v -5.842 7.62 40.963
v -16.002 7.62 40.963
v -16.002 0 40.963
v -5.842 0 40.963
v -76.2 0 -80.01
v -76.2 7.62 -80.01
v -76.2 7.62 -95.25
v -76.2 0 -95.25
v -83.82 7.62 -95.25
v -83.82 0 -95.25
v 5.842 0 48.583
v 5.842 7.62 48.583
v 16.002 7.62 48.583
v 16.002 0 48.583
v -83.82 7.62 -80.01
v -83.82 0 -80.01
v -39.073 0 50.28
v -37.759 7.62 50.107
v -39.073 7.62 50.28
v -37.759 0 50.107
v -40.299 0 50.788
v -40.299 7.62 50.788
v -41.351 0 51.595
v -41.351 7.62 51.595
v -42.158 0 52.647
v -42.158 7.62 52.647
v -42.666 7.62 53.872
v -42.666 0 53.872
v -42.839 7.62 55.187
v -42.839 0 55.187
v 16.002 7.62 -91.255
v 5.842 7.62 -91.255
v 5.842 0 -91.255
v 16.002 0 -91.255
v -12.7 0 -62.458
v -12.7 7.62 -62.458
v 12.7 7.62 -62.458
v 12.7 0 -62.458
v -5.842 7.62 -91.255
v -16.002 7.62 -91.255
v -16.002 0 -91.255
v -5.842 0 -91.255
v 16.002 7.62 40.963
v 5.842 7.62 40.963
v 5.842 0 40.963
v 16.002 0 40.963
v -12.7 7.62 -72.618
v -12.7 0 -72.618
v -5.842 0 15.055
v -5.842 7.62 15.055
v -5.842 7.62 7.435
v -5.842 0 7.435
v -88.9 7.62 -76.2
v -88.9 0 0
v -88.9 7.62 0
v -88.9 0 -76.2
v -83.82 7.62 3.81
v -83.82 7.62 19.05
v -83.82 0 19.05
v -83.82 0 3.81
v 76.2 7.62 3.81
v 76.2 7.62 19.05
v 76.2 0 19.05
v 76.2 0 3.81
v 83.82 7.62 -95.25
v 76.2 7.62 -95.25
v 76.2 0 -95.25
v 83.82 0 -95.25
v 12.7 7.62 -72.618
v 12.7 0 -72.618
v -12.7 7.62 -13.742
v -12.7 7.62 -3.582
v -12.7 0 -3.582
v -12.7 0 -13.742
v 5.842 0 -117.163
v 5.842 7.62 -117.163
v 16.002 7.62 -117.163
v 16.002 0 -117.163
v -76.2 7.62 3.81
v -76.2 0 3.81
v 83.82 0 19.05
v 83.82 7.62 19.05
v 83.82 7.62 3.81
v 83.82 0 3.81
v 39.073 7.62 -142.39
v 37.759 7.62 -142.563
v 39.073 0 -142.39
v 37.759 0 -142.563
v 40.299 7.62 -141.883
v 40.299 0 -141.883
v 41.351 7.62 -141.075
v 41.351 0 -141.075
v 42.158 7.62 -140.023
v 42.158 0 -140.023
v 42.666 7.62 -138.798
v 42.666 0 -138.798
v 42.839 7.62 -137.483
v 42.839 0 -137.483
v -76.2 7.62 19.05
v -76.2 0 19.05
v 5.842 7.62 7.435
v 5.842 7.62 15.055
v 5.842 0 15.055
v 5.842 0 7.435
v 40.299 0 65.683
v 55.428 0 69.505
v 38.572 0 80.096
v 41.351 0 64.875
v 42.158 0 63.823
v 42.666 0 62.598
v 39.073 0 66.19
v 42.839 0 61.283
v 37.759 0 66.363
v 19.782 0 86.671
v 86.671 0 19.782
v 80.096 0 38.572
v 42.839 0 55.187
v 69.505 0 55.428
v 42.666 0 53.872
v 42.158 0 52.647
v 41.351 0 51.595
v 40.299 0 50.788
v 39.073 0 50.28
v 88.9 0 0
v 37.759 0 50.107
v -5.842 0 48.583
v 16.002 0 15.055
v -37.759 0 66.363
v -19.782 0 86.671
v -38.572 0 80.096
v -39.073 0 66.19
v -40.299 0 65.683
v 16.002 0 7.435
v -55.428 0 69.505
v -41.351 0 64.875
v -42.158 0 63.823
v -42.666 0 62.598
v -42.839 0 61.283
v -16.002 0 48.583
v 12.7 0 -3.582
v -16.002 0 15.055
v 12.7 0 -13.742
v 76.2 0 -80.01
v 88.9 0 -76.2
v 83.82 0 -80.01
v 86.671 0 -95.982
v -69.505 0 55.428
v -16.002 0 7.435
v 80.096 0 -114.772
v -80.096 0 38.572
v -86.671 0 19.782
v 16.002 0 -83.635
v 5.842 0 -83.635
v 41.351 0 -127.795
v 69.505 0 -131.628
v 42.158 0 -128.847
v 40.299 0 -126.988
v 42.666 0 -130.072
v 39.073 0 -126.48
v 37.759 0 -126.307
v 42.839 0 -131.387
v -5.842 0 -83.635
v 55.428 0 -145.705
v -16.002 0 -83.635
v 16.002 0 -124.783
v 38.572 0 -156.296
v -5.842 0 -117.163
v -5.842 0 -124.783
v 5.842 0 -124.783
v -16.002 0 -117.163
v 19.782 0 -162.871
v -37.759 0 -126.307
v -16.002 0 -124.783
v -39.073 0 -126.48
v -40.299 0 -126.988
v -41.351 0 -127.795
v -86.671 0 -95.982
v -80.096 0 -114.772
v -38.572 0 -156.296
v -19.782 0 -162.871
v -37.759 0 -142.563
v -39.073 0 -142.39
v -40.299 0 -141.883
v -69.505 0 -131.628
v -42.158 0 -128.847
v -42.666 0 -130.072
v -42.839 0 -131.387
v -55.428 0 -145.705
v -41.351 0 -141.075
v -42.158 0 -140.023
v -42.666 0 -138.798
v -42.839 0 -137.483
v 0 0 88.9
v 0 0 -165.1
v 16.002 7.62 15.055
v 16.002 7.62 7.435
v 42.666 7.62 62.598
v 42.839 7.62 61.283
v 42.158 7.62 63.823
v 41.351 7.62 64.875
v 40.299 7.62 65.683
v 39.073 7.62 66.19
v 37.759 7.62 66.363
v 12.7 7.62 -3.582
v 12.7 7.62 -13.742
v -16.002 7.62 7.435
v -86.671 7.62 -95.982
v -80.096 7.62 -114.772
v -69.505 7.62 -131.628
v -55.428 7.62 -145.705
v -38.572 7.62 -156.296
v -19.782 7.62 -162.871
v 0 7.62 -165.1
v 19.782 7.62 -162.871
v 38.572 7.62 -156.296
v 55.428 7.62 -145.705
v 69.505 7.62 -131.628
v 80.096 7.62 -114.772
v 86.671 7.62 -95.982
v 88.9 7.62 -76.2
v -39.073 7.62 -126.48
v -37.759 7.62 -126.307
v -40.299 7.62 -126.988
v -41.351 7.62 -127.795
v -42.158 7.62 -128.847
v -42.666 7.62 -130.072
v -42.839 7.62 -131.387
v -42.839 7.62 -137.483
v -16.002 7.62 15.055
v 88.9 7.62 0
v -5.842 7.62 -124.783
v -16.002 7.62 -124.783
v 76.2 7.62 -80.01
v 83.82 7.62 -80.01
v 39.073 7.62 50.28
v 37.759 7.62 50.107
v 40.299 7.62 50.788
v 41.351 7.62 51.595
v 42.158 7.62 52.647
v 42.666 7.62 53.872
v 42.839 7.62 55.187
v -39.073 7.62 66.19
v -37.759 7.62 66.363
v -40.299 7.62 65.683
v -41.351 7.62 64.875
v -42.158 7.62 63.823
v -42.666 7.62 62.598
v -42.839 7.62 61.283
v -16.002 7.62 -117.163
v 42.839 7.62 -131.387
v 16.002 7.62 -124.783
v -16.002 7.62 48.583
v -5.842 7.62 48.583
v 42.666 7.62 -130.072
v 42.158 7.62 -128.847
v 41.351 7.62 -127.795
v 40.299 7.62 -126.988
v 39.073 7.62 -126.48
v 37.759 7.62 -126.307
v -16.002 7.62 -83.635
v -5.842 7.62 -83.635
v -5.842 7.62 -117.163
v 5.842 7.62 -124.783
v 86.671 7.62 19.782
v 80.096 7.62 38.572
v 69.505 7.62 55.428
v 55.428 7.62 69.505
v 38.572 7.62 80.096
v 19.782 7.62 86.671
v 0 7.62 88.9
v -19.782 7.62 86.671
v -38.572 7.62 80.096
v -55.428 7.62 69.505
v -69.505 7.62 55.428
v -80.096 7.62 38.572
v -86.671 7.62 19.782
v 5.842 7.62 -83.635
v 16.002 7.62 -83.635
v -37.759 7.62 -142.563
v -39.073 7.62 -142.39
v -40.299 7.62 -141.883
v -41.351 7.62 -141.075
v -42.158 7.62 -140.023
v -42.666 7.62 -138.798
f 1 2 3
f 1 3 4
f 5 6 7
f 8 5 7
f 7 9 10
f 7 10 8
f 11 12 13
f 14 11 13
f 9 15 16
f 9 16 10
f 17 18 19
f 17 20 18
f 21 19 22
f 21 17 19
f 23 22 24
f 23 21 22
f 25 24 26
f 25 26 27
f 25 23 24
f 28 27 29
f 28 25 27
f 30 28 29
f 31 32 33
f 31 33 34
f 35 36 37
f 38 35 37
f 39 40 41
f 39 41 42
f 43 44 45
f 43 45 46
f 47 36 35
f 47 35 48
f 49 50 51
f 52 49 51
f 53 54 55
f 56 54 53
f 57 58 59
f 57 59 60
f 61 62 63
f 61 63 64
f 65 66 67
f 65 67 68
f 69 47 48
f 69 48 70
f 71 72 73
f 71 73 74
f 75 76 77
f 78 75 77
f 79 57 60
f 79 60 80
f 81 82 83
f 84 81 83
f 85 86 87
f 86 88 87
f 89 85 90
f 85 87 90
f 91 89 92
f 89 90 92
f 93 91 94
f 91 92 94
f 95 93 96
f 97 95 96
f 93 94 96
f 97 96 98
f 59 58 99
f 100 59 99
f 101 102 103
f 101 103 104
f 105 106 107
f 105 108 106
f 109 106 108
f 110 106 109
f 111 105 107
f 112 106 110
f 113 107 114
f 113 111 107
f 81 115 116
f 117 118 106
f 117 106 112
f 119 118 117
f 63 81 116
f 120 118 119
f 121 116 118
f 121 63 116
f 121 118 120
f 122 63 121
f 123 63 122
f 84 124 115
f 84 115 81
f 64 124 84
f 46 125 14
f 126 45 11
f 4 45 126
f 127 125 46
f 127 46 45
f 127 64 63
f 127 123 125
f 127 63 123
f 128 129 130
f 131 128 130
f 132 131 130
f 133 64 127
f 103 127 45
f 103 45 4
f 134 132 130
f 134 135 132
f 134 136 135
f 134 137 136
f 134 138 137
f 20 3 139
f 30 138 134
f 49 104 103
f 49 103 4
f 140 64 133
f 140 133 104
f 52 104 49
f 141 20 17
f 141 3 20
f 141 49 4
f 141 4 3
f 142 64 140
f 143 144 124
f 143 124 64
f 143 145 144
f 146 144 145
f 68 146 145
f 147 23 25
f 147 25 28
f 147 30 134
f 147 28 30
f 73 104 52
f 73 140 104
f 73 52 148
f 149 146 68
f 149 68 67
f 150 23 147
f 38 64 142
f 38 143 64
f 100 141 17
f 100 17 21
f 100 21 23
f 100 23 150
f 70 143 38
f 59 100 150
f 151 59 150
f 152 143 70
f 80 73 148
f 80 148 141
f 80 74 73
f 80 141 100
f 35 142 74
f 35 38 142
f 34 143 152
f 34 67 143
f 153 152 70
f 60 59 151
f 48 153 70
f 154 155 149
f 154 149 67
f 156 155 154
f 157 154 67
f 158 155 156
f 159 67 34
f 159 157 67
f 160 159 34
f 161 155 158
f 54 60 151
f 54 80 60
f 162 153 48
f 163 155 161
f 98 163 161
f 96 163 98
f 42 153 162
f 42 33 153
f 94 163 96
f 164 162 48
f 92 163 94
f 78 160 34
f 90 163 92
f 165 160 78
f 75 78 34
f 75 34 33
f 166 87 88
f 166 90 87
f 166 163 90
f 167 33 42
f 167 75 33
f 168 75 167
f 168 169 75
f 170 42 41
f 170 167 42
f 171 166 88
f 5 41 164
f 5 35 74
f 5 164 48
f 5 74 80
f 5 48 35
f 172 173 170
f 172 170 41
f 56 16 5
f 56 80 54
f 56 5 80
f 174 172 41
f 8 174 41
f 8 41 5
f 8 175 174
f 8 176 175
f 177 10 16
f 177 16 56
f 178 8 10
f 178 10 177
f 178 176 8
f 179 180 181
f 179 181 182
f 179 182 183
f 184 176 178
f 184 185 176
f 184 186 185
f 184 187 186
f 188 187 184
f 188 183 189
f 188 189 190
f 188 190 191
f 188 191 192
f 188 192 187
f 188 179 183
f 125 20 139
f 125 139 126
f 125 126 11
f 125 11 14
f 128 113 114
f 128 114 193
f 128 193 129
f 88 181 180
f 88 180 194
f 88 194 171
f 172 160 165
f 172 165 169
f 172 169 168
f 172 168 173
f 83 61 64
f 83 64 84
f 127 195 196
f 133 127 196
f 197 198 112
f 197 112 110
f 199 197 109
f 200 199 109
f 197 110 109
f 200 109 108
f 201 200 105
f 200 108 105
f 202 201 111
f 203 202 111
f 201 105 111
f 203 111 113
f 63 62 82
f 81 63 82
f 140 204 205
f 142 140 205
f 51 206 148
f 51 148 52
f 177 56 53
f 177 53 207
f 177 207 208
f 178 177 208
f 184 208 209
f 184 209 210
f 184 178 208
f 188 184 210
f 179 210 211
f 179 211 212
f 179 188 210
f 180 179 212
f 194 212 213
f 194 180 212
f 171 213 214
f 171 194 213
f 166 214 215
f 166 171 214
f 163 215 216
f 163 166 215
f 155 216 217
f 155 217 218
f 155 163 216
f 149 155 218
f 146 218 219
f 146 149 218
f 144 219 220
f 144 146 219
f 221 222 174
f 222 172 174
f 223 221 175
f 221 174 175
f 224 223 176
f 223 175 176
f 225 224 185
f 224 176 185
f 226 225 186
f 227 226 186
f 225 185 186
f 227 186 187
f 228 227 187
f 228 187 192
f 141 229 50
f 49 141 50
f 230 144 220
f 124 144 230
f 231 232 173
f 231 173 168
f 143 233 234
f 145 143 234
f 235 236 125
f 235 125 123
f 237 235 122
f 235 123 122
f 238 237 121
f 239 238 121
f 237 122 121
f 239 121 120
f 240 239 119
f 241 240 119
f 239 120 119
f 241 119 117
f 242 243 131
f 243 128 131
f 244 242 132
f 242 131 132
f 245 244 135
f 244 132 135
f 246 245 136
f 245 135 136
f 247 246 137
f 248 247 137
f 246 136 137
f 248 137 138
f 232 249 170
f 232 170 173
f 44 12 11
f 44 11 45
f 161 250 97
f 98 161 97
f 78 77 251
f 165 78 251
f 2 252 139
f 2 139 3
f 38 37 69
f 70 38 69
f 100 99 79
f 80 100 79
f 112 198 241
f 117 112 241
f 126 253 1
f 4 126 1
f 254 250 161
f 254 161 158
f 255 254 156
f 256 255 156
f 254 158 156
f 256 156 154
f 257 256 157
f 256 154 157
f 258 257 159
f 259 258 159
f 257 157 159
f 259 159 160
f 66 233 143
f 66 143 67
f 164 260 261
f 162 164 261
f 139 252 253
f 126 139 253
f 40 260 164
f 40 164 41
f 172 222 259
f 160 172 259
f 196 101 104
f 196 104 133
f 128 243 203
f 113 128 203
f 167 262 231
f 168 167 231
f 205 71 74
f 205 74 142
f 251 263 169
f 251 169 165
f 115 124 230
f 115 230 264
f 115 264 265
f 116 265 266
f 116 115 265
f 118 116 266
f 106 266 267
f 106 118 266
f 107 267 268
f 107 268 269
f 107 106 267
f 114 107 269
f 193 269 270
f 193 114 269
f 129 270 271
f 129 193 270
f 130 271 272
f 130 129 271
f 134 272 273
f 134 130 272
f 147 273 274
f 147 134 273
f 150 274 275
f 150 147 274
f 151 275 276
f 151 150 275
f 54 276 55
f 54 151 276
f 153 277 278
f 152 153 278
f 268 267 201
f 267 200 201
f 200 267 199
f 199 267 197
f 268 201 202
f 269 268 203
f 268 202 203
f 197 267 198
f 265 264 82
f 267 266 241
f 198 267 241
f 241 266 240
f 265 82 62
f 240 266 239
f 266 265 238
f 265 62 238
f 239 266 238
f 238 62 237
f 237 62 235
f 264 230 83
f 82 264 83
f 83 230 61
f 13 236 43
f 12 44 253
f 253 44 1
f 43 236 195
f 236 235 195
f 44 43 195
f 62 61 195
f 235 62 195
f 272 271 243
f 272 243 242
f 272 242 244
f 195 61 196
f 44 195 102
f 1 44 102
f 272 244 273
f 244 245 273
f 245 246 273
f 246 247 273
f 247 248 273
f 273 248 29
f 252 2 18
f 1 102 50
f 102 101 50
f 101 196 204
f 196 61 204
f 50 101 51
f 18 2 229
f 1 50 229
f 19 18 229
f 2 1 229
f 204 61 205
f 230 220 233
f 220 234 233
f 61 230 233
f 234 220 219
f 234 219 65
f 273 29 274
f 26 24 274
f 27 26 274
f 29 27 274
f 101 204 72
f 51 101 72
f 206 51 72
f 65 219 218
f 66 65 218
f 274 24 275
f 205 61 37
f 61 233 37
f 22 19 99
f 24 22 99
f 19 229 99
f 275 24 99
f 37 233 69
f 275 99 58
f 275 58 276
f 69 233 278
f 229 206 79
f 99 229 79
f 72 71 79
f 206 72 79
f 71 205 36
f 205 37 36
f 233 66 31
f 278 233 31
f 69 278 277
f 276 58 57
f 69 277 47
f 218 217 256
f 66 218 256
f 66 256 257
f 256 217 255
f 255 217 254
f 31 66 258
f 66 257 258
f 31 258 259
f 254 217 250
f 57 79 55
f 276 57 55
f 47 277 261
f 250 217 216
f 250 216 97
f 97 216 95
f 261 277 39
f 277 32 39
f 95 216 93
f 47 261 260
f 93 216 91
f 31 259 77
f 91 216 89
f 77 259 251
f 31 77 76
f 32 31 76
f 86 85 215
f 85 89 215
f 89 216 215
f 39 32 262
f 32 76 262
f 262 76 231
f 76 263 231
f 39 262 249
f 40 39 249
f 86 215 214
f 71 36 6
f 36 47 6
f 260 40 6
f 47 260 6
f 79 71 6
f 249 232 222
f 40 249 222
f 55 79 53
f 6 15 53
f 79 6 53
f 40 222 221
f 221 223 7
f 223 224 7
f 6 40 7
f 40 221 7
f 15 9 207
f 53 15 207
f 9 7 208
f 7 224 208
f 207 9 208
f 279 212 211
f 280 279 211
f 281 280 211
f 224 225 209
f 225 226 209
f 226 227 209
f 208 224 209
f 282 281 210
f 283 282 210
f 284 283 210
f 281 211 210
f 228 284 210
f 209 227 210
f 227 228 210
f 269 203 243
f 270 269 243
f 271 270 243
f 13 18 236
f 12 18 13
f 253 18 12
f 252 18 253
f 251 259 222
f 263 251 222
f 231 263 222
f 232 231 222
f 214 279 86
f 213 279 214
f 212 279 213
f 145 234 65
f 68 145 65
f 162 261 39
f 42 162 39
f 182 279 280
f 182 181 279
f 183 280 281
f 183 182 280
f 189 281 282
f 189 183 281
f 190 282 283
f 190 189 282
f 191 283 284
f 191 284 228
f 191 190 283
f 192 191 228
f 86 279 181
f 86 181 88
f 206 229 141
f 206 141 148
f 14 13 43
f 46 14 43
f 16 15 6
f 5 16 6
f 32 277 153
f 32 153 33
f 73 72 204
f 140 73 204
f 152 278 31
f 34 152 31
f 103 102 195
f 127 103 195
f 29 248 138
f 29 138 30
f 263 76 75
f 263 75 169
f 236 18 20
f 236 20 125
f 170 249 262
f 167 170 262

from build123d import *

# Parameters (mm, degrees)
BOSS_EXTRUDE1_DEPTH     = 7.62
SKETCH2_W               = 85.677392152
SKETCH2_H               = 16.256
CUT_EXTRUDE1_DEPTH      = 1
CUT_EXTRUDE1_DEPTH_BACK = 8.62
FILLET1_R               = 5.08
SKETCH3_W               = 10.16
SKETCH3_H               = 7.62
CUT_EXTRUDE2_DEPTH      = 8.62
SKETCH4_W               = 25.4
SKETCH4_H               = 10.16
CUT_EXTRUDE3_DEPTH      = 8.62
SKETCH5_W               = 7.62
SKETCH5_H               = 15.24
CUT_EXTRUDE5_DEPTH      = 8.62


with BuildPart() as part:
    # Sketch1 → Boss-Extrude1 (new body)
    with BuildSketch(Plane(origin=(0, 0, 0), x_dir=(1, 0, 0), z_dir=(0, 1, 0))):
        with BuildLine():
            Line((-88.9, 0), (-88.9, 76.2))
            ThreePointArc((-88.9, 76.2), (0, 165.1), (88.9, 76.2))
            Line((88.9, 76.2), (88.9, 0))
            ThreePointArc((88.9, 0), (0, -88.9), (-88.9, 0))
        make_face()
    extrude(amount=BOSS_EXTRUDE1_DEPTH)

    # Sketch2 → Cut-Extrude1 (cut, two sides)
    with BuildSketch(Plane(origin=(0, 7.62, 0), x_dir=(1, 0, 0), z_dir=(0, 1, 0))) as cut_extrude1_sk:
        with Locations((0, -58.235236409)):
            Rectangle(SKETCH2_W, SKETCH2_H)
        with Locations((0, 134.435236409)):
            Rectangle(SKETCH2_W, SKETCH2_H)
    extrude(amount=CUT_EXTRUDE1_DEPTH, mode=Mode.SUBTRACT)
    extrude(cut_extrude1_sk.sketch, amount=-CUT_EXTRUDE1_DEPTH_BACK, mode=Mode.SUBTRACT)

    # Fillet1
    fillet1_edges = [part.edges().sort_by_distance(p)[0] for p in [
        (-42.838696076, 3.81, 66.363236409),
        (-42.838696076, 3.81, 50.107236409),
        (42.838696076, 3.81, 50.107236409),
        (42.838696076, 3.81, 66.363236409),
        (-42.838696076, 3.81, -126.307236409),
        (-42.838696076, 3.81, -142.563236409),
        (42.838696076, 3.81, -142.563236409),
        (42.838696076, 3.81, -126.307236409),
    ]]
    fillet(fillet1_edges, radius=FILLET1_R)

    # Sketch3 → Cut-Extrude2 (cut, through all)
    with BuildSketch(Plane(origin=(0, 7.62, 0), x_dir=(1, 0, 0), z_dir=(0, 1, 0))):
        with Locations((10.922, 87.445236409)):
            Rectangle(SKETCH3_W, SKETCH3_H)
        with Locations((-10.922, 87.445236409)):
            Rectangle(SKETCH3_W, SKETCH3_H)
        with Locations((10.922, 120.973236409)):
            Rectangle(SKETCH3_W, SKETCH3_H)
        with Locations((-10.922, 120.973236409)):
            Rectangle(SKETCH3_W, SKETCH3_H)
        with Locations((-10.922, -11.245236409)):
            Rectangle(SKETCH3_W, SKETCH3_H)
        with Locations((10.922, -11.245236409)):
            Rectangle(SKETCH3_W, SKETCH3_H)
        with Locations((-10.922, -44.773236409)):
            Rectangle(SKETCH3_W, SKETCH3_H)
        with Locations((10.922, -44.773236409)):
            Rectangle(SKETCH3_W, SKETCH3_H)
    extrude(amount=-CUT_EXTRUDE2_DEPTH, mode=Mode.SUBTRACT)

    # Sketch4 → Cut-Extrude3 (cut, through all)
    with BuildSketch(Plane(origin=(0, 7.62, 0), x_dir=(1, 0, 0), z_dir=(0, 1, 0))):
        with Locations((0, 67.537940424)):
            Rectangle(SKETCH4_W, SKETCH4_H)
        with Locations((0, 8.662059576)):
            Rectangle(SKETCH4_W, SKETCH4_H)
    extrude(amount=-CUT_EXTRUDE3_DEPTH, mode=Mode.SUBTRACT)

    # Sketch5 → Cut-Extrude5 (cut, through all)
    with BuildSketch(Plane(origin=(0, 7.62, 0), x_dir=(1, 0, 0), z_dir=(0, 1, 0))):
        with Locations((80.01, -11.43)):
            Rectangle(SKETCH5_W, SKETCH5_H)
        with Locations((-80.01, -11.43)):
            Rectangle(SKETCH5_W, SKETCH5_H)
        with Locations((-80.01, 87.63)):
            Rectangle(SKETCH5_W, SKETCH5_H)
        with Locations((80.01, 87.63)):
            Rectangle(SKETCH5_W, SKETCH5_H)
    extrude(amount=-CUT_EXTRUDE5_DEPTH, mode=Mode.SUBTRACT)


solid = part.part
